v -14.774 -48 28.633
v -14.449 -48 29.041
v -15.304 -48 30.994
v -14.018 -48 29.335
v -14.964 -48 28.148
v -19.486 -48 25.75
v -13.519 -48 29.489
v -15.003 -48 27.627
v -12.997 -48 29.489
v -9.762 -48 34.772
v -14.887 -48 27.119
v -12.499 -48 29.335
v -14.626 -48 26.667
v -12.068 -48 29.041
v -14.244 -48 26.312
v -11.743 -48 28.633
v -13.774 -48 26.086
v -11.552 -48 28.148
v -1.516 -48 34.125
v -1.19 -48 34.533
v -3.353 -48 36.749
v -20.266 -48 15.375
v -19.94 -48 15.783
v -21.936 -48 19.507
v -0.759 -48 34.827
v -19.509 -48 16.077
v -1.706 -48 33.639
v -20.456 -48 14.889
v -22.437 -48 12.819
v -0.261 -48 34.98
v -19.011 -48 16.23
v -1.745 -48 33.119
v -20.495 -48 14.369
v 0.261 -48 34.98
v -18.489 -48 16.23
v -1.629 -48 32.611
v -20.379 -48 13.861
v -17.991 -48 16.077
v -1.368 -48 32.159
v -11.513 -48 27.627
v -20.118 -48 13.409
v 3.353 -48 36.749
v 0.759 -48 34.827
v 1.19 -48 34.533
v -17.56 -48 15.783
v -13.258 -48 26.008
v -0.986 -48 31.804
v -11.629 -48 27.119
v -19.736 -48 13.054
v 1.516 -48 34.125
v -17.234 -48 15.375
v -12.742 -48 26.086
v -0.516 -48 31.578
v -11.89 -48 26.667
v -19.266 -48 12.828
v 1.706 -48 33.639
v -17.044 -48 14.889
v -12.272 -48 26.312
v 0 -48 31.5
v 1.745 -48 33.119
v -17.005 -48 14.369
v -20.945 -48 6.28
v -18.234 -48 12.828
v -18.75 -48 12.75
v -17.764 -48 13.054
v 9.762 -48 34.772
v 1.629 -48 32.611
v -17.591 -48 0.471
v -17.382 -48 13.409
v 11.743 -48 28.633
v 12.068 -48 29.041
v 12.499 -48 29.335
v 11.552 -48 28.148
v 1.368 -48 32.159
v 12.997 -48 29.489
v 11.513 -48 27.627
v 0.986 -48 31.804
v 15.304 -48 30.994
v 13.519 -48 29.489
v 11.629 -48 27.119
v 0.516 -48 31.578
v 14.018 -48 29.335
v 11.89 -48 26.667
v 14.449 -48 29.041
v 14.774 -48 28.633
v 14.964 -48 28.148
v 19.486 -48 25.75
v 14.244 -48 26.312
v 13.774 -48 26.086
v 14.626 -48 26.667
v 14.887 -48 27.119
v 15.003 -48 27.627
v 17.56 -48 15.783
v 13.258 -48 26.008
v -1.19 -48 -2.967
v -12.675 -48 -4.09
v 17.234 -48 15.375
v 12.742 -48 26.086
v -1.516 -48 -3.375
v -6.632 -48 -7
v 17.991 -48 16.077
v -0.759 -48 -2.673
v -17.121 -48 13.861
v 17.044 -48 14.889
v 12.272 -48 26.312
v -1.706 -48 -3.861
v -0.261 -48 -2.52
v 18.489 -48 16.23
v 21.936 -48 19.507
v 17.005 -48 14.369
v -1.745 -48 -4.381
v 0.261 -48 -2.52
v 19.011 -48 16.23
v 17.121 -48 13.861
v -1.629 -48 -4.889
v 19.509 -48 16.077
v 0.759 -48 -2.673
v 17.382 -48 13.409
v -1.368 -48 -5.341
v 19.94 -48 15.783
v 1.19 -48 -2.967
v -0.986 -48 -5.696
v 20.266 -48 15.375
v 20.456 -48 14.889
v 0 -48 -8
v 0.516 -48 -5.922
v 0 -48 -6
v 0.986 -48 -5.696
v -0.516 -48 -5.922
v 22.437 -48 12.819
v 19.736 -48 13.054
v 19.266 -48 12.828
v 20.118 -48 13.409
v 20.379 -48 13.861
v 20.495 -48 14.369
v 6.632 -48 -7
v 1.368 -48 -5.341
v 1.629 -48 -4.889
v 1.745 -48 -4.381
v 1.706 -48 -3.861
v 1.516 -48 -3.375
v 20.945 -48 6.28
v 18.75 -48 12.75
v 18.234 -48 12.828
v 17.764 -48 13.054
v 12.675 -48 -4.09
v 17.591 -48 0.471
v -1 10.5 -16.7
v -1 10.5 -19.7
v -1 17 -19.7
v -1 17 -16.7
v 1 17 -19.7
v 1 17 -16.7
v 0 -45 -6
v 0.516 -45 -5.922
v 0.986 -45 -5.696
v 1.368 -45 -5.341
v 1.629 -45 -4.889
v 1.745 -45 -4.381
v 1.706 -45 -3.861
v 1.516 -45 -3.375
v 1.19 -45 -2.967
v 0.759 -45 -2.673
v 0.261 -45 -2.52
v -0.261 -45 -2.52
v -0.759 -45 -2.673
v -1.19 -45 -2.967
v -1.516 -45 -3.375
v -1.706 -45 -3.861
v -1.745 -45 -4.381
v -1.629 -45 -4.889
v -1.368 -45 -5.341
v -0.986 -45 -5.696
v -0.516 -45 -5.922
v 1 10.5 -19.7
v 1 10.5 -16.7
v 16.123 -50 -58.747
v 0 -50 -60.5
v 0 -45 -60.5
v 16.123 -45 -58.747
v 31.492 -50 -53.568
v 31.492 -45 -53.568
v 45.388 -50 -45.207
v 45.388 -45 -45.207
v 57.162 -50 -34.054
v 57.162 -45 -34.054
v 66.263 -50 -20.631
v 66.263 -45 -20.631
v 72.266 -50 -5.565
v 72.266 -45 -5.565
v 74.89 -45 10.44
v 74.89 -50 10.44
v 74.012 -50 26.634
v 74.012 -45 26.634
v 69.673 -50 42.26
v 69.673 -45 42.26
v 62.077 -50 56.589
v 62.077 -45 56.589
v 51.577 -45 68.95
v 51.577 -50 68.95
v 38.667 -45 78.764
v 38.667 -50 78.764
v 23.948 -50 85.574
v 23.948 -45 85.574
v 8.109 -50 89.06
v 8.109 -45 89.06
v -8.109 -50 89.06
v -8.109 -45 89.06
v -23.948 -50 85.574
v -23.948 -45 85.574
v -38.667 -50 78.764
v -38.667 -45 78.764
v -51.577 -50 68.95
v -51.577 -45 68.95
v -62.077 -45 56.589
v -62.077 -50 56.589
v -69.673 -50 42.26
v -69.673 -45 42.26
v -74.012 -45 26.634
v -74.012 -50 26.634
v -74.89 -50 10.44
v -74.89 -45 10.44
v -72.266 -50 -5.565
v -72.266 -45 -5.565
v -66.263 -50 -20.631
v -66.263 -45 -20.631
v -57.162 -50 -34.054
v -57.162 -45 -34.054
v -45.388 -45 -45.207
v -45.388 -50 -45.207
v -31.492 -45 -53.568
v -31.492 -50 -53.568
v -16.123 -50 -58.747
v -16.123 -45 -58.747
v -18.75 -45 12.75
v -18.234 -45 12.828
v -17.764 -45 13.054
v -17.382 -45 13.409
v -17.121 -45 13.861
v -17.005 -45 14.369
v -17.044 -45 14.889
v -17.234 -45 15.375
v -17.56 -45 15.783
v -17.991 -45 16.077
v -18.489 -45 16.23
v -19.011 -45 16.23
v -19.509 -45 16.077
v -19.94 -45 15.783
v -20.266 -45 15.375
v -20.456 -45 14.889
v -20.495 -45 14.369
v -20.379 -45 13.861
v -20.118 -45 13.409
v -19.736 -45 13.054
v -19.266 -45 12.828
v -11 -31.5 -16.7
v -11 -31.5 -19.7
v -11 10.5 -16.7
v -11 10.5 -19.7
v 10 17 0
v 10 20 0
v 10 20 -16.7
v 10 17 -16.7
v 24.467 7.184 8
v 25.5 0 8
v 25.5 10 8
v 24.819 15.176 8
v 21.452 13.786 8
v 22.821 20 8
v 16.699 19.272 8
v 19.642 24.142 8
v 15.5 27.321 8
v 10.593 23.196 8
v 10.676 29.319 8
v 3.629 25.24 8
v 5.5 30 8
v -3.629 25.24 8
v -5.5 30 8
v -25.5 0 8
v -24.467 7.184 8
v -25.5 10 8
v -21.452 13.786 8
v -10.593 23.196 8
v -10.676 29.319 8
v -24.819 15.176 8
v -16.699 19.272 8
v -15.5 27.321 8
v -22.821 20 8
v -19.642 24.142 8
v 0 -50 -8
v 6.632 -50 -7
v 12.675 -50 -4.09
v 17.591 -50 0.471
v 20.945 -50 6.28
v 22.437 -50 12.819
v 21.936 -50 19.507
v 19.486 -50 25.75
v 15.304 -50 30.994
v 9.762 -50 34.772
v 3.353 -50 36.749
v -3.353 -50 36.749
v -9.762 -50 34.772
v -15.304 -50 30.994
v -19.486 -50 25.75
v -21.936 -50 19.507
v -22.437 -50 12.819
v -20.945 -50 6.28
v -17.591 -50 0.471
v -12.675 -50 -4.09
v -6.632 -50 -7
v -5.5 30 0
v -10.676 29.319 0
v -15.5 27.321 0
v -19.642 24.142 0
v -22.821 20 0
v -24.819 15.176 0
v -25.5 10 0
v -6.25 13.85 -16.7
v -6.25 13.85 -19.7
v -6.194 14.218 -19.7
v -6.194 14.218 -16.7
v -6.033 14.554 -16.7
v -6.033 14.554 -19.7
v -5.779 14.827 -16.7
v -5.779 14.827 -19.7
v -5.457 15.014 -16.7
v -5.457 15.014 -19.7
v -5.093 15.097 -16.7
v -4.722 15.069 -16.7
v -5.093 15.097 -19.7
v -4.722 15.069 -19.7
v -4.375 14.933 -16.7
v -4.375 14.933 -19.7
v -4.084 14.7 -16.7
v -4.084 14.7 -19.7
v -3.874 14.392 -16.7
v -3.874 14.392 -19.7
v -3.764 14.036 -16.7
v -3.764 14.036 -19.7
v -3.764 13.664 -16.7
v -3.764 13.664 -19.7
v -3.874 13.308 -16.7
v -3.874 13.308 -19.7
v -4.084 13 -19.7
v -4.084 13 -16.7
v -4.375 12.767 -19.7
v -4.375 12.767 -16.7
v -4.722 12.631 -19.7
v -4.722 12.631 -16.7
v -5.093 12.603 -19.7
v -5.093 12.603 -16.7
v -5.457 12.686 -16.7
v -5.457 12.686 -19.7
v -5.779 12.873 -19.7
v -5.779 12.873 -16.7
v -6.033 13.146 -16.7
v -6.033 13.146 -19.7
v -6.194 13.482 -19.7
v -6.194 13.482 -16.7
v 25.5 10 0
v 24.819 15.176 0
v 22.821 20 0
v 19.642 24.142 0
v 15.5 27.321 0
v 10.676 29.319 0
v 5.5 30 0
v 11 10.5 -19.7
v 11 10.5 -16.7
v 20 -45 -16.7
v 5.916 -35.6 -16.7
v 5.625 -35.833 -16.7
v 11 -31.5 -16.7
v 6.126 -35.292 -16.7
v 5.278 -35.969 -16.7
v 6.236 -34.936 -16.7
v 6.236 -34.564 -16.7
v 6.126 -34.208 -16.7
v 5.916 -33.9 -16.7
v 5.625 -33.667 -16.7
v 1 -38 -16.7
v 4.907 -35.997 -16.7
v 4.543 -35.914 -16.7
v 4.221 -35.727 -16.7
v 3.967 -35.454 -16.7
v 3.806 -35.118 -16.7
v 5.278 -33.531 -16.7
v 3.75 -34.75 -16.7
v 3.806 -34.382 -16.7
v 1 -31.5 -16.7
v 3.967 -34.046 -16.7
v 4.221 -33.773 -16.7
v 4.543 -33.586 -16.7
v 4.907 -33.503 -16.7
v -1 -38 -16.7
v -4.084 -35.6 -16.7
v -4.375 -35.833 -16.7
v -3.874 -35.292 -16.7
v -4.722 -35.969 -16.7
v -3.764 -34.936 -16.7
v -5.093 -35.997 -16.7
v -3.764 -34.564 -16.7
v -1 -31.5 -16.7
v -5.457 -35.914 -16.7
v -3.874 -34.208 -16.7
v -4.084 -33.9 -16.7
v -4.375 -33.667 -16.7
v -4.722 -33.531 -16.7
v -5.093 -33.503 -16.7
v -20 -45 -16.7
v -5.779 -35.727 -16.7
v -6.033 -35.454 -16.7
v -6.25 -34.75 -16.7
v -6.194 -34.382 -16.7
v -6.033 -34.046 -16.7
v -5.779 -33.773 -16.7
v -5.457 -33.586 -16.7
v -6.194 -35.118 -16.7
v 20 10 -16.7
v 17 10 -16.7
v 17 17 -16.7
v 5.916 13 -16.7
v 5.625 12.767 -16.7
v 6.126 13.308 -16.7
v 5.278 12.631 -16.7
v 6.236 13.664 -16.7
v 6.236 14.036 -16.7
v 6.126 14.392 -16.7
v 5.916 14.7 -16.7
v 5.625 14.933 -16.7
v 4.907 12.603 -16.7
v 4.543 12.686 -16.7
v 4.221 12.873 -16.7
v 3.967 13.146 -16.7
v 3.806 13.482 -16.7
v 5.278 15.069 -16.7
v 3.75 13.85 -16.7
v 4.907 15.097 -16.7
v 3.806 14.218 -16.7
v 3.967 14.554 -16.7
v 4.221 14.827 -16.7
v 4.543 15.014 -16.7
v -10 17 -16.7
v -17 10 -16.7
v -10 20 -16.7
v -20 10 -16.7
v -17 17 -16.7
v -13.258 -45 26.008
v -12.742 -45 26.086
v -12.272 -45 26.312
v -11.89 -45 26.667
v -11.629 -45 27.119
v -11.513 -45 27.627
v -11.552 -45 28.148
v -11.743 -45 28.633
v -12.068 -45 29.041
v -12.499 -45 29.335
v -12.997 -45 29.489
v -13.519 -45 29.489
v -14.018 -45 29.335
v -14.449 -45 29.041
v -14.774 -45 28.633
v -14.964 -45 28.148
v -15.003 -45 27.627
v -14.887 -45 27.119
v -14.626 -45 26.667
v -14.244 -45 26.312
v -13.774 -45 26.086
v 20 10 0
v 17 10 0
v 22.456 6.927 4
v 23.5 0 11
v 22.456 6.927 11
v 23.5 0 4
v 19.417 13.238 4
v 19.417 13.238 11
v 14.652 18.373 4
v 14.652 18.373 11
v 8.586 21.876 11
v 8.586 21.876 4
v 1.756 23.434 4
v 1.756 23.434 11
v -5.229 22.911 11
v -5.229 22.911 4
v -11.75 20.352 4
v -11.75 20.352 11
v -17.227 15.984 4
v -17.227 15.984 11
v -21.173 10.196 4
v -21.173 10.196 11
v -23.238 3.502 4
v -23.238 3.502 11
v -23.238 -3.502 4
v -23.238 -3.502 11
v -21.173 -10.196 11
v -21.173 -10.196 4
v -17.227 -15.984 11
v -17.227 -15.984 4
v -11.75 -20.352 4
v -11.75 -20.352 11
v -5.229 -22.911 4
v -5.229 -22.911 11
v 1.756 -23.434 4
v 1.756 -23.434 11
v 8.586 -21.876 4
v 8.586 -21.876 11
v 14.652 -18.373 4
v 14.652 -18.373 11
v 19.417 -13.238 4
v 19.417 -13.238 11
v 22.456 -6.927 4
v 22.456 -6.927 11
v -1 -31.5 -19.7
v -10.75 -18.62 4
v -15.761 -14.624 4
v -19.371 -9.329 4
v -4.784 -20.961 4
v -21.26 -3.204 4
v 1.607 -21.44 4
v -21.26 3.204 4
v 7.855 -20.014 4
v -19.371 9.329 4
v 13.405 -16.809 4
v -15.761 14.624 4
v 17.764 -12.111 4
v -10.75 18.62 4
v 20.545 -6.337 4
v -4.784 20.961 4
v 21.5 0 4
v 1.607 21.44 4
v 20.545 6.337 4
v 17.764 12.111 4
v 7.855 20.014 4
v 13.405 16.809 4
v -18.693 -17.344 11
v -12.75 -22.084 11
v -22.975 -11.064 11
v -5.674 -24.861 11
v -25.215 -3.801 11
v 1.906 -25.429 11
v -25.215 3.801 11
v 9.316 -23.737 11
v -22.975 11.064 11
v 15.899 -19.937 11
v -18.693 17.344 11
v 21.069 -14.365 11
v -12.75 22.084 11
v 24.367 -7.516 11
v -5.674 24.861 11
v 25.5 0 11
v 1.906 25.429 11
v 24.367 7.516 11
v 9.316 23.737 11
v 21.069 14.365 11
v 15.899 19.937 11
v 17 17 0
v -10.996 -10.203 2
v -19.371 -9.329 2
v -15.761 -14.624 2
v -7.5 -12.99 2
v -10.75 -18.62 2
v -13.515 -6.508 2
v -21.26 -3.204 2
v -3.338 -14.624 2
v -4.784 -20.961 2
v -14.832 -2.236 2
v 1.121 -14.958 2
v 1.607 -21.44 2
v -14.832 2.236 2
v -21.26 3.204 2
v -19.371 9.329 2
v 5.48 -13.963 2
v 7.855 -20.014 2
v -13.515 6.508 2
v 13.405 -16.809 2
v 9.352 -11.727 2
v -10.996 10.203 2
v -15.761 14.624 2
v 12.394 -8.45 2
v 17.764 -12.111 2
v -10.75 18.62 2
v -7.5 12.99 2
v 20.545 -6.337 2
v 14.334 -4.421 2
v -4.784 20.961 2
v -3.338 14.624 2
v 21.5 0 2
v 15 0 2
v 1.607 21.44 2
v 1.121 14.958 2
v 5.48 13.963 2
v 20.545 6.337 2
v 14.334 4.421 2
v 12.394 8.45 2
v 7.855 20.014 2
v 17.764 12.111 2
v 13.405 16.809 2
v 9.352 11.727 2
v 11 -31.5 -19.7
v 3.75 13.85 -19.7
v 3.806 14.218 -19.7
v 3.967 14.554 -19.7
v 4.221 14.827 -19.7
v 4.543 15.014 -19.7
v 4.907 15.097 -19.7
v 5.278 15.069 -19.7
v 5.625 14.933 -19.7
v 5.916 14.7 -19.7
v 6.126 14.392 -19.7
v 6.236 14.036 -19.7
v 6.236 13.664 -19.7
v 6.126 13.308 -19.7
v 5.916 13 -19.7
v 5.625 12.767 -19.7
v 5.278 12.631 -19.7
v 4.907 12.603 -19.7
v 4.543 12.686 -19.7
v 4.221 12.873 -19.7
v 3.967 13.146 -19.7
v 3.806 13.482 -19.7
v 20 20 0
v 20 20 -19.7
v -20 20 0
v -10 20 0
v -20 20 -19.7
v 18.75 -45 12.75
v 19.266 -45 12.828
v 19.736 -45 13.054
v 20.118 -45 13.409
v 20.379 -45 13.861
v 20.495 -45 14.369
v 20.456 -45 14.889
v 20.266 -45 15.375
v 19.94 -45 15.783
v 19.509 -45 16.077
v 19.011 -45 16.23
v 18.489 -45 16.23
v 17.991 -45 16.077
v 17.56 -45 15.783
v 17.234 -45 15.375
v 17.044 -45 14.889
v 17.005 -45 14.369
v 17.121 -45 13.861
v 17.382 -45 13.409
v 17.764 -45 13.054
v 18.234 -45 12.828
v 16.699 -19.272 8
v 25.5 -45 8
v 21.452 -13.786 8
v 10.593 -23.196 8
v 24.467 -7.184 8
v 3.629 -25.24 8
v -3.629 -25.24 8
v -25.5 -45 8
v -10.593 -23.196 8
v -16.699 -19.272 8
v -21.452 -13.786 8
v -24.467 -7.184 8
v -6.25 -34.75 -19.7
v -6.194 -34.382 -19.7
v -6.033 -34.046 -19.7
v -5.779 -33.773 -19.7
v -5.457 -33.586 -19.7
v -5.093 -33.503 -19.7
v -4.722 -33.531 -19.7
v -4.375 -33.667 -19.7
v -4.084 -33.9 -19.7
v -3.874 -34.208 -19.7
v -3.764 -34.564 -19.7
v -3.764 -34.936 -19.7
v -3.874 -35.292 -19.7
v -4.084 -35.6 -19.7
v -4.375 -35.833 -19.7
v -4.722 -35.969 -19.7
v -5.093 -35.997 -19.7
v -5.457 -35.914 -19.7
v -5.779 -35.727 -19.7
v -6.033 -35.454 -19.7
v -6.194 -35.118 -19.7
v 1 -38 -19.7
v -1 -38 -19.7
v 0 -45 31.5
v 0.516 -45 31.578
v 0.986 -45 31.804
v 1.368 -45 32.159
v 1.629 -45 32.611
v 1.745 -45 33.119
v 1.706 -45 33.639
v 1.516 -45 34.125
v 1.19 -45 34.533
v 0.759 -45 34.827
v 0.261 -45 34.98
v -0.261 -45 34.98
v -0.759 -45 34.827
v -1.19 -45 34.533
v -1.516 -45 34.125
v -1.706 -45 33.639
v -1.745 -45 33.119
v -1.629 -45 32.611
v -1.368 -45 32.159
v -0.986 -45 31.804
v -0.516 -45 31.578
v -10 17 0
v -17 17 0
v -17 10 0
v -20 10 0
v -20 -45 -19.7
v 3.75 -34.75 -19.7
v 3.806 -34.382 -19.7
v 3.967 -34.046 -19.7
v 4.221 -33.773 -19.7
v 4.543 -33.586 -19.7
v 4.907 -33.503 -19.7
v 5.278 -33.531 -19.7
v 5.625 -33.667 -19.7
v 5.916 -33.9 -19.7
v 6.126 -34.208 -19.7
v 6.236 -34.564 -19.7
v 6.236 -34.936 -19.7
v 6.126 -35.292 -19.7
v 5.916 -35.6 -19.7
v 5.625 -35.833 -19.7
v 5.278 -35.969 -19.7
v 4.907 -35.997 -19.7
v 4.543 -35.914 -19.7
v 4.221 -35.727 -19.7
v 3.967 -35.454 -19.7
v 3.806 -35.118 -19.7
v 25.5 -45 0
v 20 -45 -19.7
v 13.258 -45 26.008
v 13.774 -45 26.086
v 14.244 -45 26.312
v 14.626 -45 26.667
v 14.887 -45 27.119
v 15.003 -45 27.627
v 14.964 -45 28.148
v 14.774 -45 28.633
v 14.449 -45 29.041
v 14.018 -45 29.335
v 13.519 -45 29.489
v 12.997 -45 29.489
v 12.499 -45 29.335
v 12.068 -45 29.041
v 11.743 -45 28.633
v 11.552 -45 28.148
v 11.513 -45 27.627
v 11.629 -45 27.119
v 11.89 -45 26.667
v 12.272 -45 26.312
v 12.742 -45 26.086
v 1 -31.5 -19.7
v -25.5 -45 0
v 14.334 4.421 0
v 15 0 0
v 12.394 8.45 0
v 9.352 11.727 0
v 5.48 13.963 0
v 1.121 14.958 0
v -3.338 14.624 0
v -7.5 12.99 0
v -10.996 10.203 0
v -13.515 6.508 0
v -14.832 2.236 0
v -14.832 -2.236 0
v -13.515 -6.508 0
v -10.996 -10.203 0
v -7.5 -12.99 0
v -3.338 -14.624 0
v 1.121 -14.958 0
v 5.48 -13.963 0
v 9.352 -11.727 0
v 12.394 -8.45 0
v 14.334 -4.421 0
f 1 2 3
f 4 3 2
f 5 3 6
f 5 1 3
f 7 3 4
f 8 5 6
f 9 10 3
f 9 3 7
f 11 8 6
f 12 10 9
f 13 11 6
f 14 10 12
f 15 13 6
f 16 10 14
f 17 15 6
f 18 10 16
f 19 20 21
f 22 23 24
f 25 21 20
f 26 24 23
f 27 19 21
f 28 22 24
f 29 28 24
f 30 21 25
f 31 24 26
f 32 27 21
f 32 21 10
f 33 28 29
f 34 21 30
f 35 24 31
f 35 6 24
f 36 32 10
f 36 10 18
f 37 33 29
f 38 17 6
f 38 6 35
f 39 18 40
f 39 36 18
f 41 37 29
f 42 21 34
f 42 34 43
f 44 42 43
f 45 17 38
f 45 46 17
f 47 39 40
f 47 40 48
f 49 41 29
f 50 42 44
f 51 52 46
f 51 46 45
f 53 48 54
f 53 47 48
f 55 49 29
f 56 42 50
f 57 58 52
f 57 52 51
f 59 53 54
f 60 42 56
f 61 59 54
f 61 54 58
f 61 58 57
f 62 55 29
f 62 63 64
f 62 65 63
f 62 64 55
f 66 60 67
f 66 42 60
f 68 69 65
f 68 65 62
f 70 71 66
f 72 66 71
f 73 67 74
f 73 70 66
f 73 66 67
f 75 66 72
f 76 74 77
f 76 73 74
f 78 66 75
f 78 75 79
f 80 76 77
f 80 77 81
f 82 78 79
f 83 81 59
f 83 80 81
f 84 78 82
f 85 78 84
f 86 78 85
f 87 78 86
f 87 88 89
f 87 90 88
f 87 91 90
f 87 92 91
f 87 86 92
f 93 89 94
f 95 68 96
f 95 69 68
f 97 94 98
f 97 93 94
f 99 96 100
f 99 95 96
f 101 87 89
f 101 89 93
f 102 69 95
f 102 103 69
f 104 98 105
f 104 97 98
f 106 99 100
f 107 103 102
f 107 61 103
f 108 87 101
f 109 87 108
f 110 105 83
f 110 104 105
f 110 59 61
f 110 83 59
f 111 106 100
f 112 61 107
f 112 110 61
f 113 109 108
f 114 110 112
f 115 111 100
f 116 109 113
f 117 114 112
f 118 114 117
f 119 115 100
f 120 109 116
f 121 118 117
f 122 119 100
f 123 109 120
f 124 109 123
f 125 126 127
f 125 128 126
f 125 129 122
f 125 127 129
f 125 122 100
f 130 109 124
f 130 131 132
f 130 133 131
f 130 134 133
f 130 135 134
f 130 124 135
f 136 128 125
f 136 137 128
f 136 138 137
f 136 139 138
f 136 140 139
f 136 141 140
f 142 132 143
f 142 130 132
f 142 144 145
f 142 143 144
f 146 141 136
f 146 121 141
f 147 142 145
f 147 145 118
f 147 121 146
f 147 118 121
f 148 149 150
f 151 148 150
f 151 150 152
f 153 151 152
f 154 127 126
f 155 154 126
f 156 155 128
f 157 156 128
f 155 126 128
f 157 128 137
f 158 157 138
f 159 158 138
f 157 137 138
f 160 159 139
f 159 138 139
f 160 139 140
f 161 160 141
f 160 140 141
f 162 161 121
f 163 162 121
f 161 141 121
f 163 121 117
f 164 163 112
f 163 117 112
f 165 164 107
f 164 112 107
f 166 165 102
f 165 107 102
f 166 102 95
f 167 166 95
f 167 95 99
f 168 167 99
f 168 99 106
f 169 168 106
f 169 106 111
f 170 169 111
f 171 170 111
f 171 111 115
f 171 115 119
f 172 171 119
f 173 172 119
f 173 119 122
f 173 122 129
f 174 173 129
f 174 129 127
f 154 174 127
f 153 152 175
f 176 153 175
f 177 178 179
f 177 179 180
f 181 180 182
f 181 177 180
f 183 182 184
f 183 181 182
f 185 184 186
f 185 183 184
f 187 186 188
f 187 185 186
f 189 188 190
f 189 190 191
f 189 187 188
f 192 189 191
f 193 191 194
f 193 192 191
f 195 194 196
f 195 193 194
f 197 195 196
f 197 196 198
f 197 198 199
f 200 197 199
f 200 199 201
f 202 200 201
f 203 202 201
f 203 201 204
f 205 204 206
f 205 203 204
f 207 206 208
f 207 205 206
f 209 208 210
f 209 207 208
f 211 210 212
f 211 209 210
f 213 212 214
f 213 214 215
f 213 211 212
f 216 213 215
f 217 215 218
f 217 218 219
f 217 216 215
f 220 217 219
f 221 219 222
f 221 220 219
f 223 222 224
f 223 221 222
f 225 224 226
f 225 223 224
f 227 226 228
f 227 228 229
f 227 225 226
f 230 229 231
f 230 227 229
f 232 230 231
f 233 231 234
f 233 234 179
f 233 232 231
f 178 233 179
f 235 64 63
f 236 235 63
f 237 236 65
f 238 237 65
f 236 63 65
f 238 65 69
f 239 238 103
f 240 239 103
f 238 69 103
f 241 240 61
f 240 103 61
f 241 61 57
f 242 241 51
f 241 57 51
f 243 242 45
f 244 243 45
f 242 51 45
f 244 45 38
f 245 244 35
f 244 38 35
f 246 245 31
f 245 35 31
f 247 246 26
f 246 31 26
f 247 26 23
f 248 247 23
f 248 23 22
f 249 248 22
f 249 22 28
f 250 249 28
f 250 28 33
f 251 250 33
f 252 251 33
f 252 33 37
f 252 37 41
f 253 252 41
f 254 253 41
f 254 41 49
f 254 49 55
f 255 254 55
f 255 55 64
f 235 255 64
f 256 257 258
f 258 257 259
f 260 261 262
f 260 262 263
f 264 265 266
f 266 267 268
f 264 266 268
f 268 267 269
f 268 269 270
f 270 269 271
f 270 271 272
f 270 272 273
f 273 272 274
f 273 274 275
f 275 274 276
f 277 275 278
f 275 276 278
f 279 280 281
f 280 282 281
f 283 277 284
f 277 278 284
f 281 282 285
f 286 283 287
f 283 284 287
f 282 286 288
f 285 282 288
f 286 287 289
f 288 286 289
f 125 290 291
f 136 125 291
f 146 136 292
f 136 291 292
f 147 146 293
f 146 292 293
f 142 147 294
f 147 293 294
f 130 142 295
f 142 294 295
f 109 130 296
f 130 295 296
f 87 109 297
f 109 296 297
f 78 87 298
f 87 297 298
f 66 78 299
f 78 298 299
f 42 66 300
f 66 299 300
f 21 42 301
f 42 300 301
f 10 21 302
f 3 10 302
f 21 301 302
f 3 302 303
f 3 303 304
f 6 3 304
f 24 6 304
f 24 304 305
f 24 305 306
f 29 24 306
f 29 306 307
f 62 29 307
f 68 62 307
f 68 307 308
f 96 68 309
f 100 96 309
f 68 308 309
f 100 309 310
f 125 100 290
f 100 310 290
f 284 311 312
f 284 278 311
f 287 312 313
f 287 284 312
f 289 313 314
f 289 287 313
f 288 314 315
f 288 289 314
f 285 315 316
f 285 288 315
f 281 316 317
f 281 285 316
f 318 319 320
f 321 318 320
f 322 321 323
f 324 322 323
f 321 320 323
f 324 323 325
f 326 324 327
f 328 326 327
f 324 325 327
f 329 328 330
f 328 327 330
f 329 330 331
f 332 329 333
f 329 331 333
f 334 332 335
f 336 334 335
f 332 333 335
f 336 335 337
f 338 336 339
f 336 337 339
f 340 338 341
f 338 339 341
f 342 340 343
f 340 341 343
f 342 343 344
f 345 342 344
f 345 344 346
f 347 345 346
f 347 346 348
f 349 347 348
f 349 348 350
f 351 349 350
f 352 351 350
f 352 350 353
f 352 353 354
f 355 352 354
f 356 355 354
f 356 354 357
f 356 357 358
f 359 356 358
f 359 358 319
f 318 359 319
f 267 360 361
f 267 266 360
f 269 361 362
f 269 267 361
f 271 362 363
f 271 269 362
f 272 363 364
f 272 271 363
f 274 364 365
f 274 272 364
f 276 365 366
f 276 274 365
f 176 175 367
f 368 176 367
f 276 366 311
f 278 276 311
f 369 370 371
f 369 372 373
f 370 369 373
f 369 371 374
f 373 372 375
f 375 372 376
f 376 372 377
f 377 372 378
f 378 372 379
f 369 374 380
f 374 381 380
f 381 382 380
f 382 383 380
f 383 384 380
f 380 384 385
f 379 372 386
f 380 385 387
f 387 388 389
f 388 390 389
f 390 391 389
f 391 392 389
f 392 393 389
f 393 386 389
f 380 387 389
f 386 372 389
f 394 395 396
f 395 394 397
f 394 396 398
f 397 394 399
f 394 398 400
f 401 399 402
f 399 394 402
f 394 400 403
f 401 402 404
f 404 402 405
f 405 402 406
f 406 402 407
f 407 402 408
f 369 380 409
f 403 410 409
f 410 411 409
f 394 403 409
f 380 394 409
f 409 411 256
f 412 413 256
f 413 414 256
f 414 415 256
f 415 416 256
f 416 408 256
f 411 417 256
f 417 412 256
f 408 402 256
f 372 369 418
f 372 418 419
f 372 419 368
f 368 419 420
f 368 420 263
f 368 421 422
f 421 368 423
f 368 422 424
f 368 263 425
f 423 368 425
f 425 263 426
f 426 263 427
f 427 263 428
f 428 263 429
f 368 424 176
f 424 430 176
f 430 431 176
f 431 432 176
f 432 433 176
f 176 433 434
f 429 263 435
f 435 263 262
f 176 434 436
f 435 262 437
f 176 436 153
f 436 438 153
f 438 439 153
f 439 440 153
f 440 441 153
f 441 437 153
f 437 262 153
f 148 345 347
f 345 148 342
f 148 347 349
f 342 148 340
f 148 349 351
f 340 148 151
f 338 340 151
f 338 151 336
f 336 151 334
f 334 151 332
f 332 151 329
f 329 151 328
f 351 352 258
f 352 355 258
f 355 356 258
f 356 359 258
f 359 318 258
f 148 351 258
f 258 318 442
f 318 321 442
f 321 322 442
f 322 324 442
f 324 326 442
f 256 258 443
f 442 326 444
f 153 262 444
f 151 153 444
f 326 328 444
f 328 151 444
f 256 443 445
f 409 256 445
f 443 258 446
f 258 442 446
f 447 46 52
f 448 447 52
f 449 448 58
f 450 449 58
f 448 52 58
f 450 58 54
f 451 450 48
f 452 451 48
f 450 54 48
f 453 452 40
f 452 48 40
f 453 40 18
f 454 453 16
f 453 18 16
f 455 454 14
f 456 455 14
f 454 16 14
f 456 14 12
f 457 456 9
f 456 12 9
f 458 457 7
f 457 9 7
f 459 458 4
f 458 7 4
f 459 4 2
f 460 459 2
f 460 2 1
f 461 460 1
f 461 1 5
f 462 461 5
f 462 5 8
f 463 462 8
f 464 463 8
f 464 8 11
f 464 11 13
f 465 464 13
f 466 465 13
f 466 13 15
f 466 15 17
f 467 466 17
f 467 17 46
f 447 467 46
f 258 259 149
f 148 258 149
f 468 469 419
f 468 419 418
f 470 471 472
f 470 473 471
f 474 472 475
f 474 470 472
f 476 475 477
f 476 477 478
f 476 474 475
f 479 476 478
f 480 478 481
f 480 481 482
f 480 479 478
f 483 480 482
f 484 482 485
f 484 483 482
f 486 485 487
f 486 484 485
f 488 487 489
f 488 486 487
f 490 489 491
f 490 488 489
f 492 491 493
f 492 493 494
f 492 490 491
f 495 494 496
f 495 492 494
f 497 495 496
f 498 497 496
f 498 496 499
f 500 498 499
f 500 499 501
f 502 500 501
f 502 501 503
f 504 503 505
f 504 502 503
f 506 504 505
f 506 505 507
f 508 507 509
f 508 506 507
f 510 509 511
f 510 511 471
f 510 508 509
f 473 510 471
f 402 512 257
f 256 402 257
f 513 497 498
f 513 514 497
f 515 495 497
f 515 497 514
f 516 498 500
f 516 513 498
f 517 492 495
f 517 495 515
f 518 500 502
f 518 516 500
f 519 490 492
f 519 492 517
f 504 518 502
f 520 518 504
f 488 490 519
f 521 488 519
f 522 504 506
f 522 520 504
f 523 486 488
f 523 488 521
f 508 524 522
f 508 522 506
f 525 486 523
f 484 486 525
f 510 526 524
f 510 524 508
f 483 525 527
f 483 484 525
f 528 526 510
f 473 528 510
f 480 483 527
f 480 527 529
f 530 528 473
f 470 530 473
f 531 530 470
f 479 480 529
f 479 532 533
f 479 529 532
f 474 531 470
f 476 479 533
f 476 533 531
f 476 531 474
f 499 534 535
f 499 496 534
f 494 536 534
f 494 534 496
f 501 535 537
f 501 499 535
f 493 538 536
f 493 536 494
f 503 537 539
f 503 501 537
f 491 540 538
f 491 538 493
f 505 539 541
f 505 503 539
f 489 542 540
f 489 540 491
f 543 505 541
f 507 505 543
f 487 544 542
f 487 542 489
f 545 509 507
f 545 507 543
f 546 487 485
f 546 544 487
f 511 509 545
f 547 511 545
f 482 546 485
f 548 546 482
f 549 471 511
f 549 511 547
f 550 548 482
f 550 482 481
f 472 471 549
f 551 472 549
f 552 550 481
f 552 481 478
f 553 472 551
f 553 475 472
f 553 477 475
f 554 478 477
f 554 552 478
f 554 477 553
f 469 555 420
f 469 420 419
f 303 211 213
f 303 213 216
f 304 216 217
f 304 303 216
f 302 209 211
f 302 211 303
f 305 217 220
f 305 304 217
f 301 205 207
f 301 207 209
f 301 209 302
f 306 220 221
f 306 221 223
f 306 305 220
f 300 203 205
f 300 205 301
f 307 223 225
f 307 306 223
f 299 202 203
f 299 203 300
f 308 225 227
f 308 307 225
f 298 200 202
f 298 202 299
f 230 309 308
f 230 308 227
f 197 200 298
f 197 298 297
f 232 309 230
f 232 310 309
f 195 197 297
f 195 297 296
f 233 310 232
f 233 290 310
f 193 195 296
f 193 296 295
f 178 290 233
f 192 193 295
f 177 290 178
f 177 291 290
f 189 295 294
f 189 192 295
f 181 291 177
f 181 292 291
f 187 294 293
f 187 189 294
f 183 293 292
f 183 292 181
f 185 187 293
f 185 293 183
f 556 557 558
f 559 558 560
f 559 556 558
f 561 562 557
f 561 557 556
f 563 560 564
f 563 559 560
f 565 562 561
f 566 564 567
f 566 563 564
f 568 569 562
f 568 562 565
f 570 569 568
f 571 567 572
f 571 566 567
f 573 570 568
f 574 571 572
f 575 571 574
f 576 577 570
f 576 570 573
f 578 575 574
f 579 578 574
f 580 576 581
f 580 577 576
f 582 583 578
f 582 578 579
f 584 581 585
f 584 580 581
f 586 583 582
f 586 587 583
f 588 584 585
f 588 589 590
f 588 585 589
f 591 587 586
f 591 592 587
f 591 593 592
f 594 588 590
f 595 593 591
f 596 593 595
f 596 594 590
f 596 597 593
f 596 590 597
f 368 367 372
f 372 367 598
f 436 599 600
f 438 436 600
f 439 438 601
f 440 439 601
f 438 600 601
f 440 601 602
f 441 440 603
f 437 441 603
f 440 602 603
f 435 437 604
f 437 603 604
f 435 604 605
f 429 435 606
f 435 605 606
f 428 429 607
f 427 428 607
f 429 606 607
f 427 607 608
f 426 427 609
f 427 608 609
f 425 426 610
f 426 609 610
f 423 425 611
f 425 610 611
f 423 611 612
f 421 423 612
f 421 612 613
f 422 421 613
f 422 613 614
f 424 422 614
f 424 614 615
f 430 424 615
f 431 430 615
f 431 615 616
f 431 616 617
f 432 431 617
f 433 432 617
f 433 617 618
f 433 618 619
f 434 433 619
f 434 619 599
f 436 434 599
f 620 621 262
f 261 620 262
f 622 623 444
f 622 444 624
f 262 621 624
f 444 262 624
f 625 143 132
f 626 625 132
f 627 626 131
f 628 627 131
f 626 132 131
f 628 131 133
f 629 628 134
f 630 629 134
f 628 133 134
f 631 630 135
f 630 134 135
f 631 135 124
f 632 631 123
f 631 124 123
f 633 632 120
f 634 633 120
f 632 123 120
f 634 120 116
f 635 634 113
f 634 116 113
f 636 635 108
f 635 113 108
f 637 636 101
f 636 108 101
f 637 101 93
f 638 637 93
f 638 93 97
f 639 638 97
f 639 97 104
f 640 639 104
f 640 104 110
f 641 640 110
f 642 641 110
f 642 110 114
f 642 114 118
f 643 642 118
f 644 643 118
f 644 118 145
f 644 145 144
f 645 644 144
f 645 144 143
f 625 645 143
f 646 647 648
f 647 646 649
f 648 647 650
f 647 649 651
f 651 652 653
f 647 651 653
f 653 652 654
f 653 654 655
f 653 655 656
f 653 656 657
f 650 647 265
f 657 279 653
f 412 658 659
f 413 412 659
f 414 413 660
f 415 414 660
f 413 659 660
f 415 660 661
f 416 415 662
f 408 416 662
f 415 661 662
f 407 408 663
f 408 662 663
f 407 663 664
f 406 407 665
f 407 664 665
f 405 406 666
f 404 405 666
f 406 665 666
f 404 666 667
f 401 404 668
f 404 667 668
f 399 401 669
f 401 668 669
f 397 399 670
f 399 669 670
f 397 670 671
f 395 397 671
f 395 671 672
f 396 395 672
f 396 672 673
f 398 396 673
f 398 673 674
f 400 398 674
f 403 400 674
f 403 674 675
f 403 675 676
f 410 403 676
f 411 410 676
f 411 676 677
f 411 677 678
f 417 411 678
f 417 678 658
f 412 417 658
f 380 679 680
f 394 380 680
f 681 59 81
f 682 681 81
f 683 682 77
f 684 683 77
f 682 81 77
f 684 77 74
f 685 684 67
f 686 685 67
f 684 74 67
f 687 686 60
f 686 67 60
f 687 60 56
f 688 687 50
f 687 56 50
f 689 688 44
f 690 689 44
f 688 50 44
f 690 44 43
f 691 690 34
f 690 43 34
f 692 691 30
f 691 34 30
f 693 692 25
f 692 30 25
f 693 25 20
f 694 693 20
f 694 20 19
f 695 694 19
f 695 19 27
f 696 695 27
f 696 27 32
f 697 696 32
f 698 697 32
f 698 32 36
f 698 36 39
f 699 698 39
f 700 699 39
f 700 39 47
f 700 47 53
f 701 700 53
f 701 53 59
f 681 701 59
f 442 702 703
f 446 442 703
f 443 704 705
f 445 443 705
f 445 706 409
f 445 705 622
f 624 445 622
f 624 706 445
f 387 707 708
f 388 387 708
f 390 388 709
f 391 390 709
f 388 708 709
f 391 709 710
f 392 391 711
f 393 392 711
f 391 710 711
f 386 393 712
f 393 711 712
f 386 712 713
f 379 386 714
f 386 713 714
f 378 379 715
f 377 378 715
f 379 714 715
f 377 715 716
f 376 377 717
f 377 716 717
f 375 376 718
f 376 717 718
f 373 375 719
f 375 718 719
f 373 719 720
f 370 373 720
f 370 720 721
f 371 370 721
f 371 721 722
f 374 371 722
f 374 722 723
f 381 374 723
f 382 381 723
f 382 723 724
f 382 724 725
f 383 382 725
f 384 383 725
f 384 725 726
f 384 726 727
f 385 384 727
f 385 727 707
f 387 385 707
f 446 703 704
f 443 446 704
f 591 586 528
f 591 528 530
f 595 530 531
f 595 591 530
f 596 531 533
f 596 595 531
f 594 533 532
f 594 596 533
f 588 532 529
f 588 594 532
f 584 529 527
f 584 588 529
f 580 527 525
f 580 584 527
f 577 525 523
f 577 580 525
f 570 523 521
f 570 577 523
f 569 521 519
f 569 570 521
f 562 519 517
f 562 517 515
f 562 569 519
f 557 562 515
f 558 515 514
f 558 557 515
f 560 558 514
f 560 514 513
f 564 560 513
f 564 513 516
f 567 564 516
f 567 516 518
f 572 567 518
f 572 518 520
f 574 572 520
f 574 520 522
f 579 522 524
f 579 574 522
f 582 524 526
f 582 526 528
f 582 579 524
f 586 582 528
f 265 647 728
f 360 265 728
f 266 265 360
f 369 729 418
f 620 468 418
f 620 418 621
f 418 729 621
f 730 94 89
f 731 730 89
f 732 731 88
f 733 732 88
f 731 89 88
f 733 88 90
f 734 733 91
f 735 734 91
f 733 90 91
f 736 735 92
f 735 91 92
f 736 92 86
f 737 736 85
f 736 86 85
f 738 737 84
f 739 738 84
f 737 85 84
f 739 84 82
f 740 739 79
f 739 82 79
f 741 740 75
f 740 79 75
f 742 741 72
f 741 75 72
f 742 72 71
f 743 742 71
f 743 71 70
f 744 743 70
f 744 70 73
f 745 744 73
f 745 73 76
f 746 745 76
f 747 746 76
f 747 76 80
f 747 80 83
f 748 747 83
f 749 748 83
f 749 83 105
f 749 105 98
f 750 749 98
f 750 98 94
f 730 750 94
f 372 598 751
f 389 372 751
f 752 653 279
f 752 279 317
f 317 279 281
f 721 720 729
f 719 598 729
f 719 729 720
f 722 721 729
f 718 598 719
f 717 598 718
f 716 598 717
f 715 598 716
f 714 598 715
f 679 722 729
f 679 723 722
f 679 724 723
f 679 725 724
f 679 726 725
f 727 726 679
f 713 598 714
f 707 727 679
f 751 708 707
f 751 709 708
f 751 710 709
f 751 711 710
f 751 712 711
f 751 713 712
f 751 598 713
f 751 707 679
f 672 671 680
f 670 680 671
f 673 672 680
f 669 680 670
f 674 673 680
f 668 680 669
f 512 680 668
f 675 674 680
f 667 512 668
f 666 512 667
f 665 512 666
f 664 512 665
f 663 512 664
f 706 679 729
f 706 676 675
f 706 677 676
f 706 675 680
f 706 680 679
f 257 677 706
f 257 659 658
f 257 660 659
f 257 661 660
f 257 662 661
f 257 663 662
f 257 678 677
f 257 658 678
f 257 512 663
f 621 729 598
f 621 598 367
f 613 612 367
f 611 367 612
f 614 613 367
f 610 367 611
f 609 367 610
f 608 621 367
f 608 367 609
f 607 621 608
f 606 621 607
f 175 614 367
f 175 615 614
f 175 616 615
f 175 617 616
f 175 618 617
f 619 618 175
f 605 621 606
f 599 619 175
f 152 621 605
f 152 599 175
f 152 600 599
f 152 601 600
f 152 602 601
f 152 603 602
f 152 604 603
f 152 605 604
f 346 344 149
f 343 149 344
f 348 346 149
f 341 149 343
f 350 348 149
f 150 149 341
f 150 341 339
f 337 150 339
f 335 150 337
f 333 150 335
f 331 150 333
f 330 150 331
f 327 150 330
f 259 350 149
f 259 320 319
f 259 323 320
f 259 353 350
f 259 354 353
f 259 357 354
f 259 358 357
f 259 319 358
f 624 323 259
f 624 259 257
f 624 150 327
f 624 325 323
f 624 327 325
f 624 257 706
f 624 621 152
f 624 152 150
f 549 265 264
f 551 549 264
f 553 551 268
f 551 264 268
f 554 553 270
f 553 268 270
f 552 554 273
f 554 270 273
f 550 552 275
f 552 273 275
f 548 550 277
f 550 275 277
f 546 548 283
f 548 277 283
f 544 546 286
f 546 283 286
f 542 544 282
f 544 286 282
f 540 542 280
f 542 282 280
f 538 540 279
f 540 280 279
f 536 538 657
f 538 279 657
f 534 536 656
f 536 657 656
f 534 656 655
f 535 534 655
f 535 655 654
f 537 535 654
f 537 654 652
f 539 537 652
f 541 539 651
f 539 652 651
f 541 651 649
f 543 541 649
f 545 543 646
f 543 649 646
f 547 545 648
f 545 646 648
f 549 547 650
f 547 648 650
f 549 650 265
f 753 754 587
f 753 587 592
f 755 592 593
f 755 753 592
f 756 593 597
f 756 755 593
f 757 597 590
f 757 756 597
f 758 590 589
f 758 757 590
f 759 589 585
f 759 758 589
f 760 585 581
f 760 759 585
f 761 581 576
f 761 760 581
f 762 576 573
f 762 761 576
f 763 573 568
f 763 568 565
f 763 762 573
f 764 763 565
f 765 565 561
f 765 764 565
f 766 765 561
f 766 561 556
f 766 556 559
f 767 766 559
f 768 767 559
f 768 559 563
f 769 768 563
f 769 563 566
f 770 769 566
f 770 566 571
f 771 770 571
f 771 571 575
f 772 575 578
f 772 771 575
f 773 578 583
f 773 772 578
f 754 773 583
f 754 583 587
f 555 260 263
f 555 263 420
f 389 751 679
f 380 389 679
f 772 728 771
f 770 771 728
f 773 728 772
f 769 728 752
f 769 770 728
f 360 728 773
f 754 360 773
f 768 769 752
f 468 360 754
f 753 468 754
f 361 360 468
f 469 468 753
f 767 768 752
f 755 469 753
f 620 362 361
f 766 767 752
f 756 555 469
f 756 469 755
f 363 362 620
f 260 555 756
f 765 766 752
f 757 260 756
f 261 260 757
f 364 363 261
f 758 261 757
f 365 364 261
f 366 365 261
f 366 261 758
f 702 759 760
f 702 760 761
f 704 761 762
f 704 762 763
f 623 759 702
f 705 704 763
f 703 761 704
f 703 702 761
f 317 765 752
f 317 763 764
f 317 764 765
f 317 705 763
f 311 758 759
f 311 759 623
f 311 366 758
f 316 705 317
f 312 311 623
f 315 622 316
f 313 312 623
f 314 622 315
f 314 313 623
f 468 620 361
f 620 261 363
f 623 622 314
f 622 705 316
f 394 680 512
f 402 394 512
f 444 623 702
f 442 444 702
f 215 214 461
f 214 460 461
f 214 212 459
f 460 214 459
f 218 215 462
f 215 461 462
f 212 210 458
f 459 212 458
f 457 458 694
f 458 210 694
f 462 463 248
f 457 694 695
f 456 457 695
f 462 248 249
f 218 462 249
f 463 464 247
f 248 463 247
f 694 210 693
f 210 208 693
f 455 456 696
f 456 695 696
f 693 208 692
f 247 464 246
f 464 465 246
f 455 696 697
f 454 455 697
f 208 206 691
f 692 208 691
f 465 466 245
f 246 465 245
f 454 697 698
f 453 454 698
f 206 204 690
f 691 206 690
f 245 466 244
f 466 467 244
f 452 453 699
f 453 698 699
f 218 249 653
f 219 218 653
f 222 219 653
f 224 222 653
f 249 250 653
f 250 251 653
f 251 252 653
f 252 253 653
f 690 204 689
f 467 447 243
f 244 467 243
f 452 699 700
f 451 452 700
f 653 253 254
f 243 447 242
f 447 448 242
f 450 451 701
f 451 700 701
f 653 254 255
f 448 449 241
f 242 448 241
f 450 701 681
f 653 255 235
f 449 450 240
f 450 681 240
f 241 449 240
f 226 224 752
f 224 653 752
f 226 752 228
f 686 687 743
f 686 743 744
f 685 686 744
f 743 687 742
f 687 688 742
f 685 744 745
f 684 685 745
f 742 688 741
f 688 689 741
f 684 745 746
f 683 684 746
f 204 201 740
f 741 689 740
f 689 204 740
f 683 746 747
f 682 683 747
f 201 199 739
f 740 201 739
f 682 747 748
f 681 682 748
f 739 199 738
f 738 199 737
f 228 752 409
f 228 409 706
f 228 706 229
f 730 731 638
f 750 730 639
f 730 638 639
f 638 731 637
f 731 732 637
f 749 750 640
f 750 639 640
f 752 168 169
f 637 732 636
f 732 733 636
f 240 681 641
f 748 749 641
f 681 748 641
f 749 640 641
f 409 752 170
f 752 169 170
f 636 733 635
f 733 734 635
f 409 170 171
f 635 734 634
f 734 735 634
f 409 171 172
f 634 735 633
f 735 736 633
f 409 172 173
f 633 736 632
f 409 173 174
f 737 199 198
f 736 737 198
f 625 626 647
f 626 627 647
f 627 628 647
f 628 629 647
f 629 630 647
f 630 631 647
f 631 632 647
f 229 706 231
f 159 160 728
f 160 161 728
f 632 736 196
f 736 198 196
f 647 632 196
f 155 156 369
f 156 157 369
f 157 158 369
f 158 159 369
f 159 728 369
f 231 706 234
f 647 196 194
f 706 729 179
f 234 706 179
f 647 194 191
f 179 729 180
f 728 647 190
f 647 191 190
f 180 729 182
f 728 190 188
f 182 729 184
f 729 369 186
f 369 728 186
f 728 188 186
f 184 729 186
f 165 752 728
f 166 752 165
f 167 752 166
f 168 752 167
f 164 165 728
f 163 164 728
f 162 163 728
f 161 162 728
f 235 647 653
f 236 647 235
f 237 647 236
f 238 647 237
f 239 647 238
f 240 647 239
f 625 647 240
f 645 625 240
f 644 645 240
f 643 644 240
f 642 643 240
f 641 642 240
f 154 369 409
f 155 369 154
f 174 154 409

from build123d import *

# Parameters (mm, degrees)
SKETCH_1_R          = 25.5
SKETCH_1_R_2        = 15
EXTRUDE_1_DEPTH     = 2
SKETCH_2_R          = 25.5
SKETCH_2_R_2        = 21.5
EXTRUDE_2_DEPTH     = 2
SKETCH_3_R          = 25.5
SKETCH_3_R_2        = 23.5
EXTRUDE_3_DEPTH     = 7
SKETCH_4_W          = 51
SKETCH_4_H          = 80
SKETCH_4_R          = 23.5
EXTRUDE_4_DEPTH     = 8
FILLET_1_R          = 20
SKETCH_5_W          = 51
SKETCH_5_H          = 5
EXTRUDE_5_DEPTH     = 19.7
SKETCH_6_W          = 40
SKETCH_6_H          = 70
EXTRUDE_6_DEPTH     = 3
CUT_EXTRUDE_1_REACH = 65.975
SKETCH_7_R          = 1.25
SKETCH_8_R          = 75
EXTRUDE_7_DEPTH     = 5
SKETCH_9_R          = 22.5
CUT_EXTRUDE_2_DEPTH = 2
CUT_EXTRUDE_3_REACH = 142.425
SKETCH_10_R         = 1.75


with BuildPart() as part:
    # 스케치1 → 보스-돌출1 (new body)
    with BuildSketch(Plane.XY):
        Circle(SKETCH_1_R)
        Circle(SKETCH_1_R_2, mode=Mode.SUBTRACT)
    extrude(amount=EXTRUDE_1_DEPTH)

    # 스케치2 → 보스-돌출2 (add)
    with BuildSketch(Plane.XY.offset(2)):
        Circle(SKETCH_2_R)
        Circle(SKETCH_2_R_2, mode=Mode.SUBTRACT)
    extrude(amount=EXTRUDE_2_DEPTH)

    # 스케치3 → 보스-돌출3 (add)
    with BuildSketch(Plane.XY.offset(4)):
        Circle(SKETCH_3_R)
        Circle(SKETCH_3_R_2, mode=Mode.SUBTRACT)
    extrude(amount=EXTRUDE_3_DEPTH)

    # 스케치4 → 보스-돌출4 (add)
    with BuildSketch(Plane(origin=(0, 0, 0), x_dir=(-1, 0, 0), z_dir=(0, 0, -1))):
        with Locations((0, -10)):
            Rectangle(SKETCH_4_W, SKETCH_4_H)
        with Locations(Location((0, 0, 0), (0, 0, 180))):
            Circle(SKETCH_4_R, mode=Mode.SUBTRACT)
    extrude(amount=-EXTRUDE_4_DEPTH)

    # 필렛1
    fillet_1_edges = [part.edges().sort_by_distance(p)[0] for p in [
        (-25.5, 30, 4),
        (25.5, 30, 4),
    ]]
    fillet(fillet_1_edges, radius=FILLET_1_R)

    # 스케치5 → 보스-돌출5 (add)
    with BuildSketch(Plane(origin=(0, 0, 0), x_dir=(-1, 0, 0), z_dir=(0, 0, -1))):
        Polygon((-20, 20), (-10, 20), (-10, 17), (-17, 17), (-17, 10), (-20, 10), align=None)
        Polygon((20, 20), (10, 20), (10, 17), (17, 17), (17, 10), (20, 10), align=None)
        with Locations((0, -47.5)):
            Rectangle(SKETCH_5_W, SKETCH_5_H)
    extrude(amount=EXTRUDE_5_DEPTH)

    # 스케치6 → 보스-돌출6 (add)
    with BuildSketch(Plane(origin=(0, 0, -19.7), x_dir=(-1, 0, 0), z_dir=(0, 0, -1))):
        with Locations((0, -15)):
            Rectangle(SKETCH_6_W, SKETCH_6_H)
    extrude(amount=-EXTRUDE_6_DEPTH)

    # 스케치7 → 컷-돌출1 (cut, up to next)
    with BuildSketch(Plane(origin=(0, 0, -19.7), x_dir=(-1, 0, 0), z_dir=(0, 0, -1)), mode=Mode.PRIVATE) as cut_extrude_1_sk1:
        with Locations((-5, 13.85)):
            Circle(SKETCH_7_R)
    cut_extrude_1_tool1 = extrude(cut_extrude_1_sk1.sketch, amount=-CUT_EXTRUDE_1_REACH, mode=Mode.PRIVATE) & part.part
    # 스케치7 → 컷-돌출1 (cut, up to next)
    with BuildSketch(Plane(origin=(0, 0, -19.7), x_dir=(-1, 0, 0), z_dir=(0, 0, -1)), mode=Mode.PRIVATE) as cut_extrude_1_sk2:
        with Locations((5, 13.85)):
            Circle(SKETCH_7_R)
    cut_extrude_1_tool2 = extrude(cut_extrude_1_sk2.sketch, amount=-CUT_EXTRUDE_1_REACH, mode=Mode.PRIVATE) & part.part
    # 스케치7 → 컷-돌출1 (cut, up to next)
    with BuildSketch(Plane(origin=(0, 0, -19.7), x_dir=(-1, 0, 0), z_dir=(0, 0, -1)), mode=Mode.PRIVATE) as cut_extrude_1_sk3:
        with Locations((5, -34.75)):
            Circle(SKETCH_7_R)
    cut_extrude_1_tool3 = extrude(cut_extrude_1_sk3.sketch, amount=-CUT_EXTRUDE_1_REACH, mode=Mode.PRIVATE) & part.part
    # 스케치7 → 컷-돌출1 (cut, up to next)
    with BuildSketch(Plane(origin=(0, 0, -19.7), x_dir=(-1, 0, 0), z_dir=(0, 0, -1)), mode=Mode.PRIVATE) as cut_extrude_1_sk4:
        with Locations((-5, -34.75)):
            Circle(SKETCH_7_R)
    cut_extrude_1_tool4 = extrude(cut_extrude_1_sk4.sketch, amount=-CUT_EXTRUDE_1_REACH, mode=Mode.PRIVATE) & part.part
    # 스케치7 → 컷-돌출1 (cut, up to next)
    with BuildSketch(Plane(origin=(0, 0, -19.7), x_dir=(-1, 0, 0), z_dir=(0, 0, -1)), mode=Mode.PRIVATE) as cut_extrude_1_sk5:
        Polygon((-11, -31.5), (-1, -31.5), (-1, -38), (1, -38), (1, -31.5), (11, -31.5), (11, 10.5), (1, 10.5), (1, 17), (-1, 17), (-1, 10.5), (-11, 10.5), align=None)
    cut_extrude_1_tool5 = extrude(cut_extrude_1_sk5.sketch, amount=-CUT_EXTRUDE_1_REACH, mode=Mode.PRIVATE) & part.part
    add(cut_extrude_1_tool1.solids().sort_by_distance((5, 13.85, -19.7))[0], mode=Mode.SUBTRACT)
    add(cut_extrude_1_tool2.solids().sort_by_distance((-5, 13.85, -19.7))[0], mode=Mode.SUBTRACT)
    add(cut_extrude_1_tool3.solids().sort_by_distance((-5, -34.75, -19.7))[0], mode=Mode.SUBTRACT)
    add(cut_extrude_1_tool4.solids().sort_by_distance((5, -34.75, -19.7))[0], mode=Mode.SUBTRACT)
    add(cut_extrude_1_tool5.solids().sort_by_distance((0, -10.5, -19.7))[0], mode=Mode.SUBTRACT)

    # 스케치8 → 보스-돌출7 (add)
    with BuildSketch(Plane.XZ.offset(50)):
        with Locations(Location((0, 14.5, 0), (0, 0, 270))):
            Circle(SKETCH_8_R)
    extrude(amount=-EXTRUDE_7_DEPTH)

    # 스케치9 → 컷-돌출2 (cut)
    with BuildSketch(Plane.XZ.offset(50)):
        with Locations(Location((0, 14.5, 0), (0, 0, 270))):
            Circle(SKETCH_9_R)
    extrude(amount=-CUT_EXTRUDE_2_DEPTH, mode=Mode.SUBTRACT)

    # 스케치10 → 컷-돌출3 (cut, up to next)
    with BuildSketch(Plane.XZ.offset(48), mode=Mode.PRIVATE) as cut_extrude_3_sk1:
        with Locations(Location((0, 33.25, 0), (0, 0, 270))):
            Circle(SKETCH_10_R)
    cut_extrude_3_tool1 = extrude(cut_extrude_3_sk1.sketch, amount=-CUT_EXTRUDE_3_REACH, mode=Mode.PRIVATE) & part.part
    # 스케치10 → 컷-돌출3 (cut, up to next)
    with BuildSketch(Plane.XZ.offset(48), mode=Mode.PRIVATE) as cut_extrude_3_sk2:
        with Locations(Location((13.258252147, 27.758252147, 0), (0, 0, 270))):
            Circle(SKETCH_10_R)
    cut_extrude_3_tool2 = extrude(cut_extrude_3_sk2.sketch, amount=-CUT_EXTRUDE_3_REACH, mode=Mode.PRIVATE) & part.part
    # 스케치10 → 컷-돌출3 (cut, up to next)
    with BuildSketch(Plane.XZ.offset(48), mode=Mode.PRIVATE) as cut_extrude_3_sk3:
        with Locations(Location((18.75, 14.5, 0), (0, 0, 270))):
            Circle(SKETCH_10_R)
    cut_extrude_3_tool3 = extrude(cut_extrude_3_sk3.sketch, amount=-CUT_EXTRUDE_3_REACH, mode=Mode.PRIVATE) & part.part
    # 스케치10 → 컷-돌출3 (cut, up to next)
    with BuildSketch(Plane.XZ.offset(48), mode=Mode.PRIVATE) as cut_extrude_3_sk4:
        with Locations(Location((0, -4.25, 0), (0, 0, 270))):
            Circle(SKETCH_10_R)
    cut_extrude_3_tool4 = extrude(cut_extrude_3_sk4.sketch, amount=-CUT_EXTRUDE_3_REACH, mode=Mode.PRIVATE) & part.part
    # 스케치10 → 컷-돌출3 (cut, up to next)
    with BuildSketch(Plane.XZ.offset(48), mode=Mode.PRIVATE) as cut_extrude_3_sk5:
        with Locations(Location((-18.75, 14.5, 0), (0, 0, 270))):
            Circle(SKETCH_10_R)
    cut_extrude_3_tool5 = extrude(cut_extrude_3_sk5.sketch, amount=-CUT_EXTRUDE_3_REACH, mode=Mode.PRIVATE) & part.part
    # 스케치10 → 컷-돌출3 (cut, up to next)
    with BuildSketch(Plane.XZ.offset(48), mode=Mode.PRIVATE) as cut_extrude_3_sk6:
        with Locations(Location((-13.258252147, 27.758252147, 0), (0, 0, 270))):
            Circle(SKETCH_10_R)
    cut_extrude_3_tool6 = extrude(cut_extrude_3_sk6.sketch, amount=-CUT_EXTRUDE_3_REACH, mode=Mode.PRIVATE) & part.part
    add(cut_extrude_3_tool1.solids().sort_by_distance((0, -48, 33.25))[0], mode=Mode.SUBTRACT)
    add(cut_extrude_3_tool2.solids().sort_by_distance((13.258252, -48, 27.758252))[0], mode=Mode.SUBTRACT)
    add(cut_extrude_3_tool3.solids().sort_by_distance((18.75, -48, 14.5))[0], mode=Mode.SUBTRACT)
    add(cut_extrude_3_tool4.solids().sort_by_distance((0, -48, -4.25))[0], mode=Mode.SUBTRACT)
    add(cut_extrude_3_tool5.solids().sort_by_distance((-18.75, -48, 14.5))[0], mode=Mode.SUBTRACT)
    add(cut_extrude_3_tool6.solids().sort_by_distance((-13.258252, -48, 27.758252))[0], mode=Mode.SUBTRACT)


solid = part.part
